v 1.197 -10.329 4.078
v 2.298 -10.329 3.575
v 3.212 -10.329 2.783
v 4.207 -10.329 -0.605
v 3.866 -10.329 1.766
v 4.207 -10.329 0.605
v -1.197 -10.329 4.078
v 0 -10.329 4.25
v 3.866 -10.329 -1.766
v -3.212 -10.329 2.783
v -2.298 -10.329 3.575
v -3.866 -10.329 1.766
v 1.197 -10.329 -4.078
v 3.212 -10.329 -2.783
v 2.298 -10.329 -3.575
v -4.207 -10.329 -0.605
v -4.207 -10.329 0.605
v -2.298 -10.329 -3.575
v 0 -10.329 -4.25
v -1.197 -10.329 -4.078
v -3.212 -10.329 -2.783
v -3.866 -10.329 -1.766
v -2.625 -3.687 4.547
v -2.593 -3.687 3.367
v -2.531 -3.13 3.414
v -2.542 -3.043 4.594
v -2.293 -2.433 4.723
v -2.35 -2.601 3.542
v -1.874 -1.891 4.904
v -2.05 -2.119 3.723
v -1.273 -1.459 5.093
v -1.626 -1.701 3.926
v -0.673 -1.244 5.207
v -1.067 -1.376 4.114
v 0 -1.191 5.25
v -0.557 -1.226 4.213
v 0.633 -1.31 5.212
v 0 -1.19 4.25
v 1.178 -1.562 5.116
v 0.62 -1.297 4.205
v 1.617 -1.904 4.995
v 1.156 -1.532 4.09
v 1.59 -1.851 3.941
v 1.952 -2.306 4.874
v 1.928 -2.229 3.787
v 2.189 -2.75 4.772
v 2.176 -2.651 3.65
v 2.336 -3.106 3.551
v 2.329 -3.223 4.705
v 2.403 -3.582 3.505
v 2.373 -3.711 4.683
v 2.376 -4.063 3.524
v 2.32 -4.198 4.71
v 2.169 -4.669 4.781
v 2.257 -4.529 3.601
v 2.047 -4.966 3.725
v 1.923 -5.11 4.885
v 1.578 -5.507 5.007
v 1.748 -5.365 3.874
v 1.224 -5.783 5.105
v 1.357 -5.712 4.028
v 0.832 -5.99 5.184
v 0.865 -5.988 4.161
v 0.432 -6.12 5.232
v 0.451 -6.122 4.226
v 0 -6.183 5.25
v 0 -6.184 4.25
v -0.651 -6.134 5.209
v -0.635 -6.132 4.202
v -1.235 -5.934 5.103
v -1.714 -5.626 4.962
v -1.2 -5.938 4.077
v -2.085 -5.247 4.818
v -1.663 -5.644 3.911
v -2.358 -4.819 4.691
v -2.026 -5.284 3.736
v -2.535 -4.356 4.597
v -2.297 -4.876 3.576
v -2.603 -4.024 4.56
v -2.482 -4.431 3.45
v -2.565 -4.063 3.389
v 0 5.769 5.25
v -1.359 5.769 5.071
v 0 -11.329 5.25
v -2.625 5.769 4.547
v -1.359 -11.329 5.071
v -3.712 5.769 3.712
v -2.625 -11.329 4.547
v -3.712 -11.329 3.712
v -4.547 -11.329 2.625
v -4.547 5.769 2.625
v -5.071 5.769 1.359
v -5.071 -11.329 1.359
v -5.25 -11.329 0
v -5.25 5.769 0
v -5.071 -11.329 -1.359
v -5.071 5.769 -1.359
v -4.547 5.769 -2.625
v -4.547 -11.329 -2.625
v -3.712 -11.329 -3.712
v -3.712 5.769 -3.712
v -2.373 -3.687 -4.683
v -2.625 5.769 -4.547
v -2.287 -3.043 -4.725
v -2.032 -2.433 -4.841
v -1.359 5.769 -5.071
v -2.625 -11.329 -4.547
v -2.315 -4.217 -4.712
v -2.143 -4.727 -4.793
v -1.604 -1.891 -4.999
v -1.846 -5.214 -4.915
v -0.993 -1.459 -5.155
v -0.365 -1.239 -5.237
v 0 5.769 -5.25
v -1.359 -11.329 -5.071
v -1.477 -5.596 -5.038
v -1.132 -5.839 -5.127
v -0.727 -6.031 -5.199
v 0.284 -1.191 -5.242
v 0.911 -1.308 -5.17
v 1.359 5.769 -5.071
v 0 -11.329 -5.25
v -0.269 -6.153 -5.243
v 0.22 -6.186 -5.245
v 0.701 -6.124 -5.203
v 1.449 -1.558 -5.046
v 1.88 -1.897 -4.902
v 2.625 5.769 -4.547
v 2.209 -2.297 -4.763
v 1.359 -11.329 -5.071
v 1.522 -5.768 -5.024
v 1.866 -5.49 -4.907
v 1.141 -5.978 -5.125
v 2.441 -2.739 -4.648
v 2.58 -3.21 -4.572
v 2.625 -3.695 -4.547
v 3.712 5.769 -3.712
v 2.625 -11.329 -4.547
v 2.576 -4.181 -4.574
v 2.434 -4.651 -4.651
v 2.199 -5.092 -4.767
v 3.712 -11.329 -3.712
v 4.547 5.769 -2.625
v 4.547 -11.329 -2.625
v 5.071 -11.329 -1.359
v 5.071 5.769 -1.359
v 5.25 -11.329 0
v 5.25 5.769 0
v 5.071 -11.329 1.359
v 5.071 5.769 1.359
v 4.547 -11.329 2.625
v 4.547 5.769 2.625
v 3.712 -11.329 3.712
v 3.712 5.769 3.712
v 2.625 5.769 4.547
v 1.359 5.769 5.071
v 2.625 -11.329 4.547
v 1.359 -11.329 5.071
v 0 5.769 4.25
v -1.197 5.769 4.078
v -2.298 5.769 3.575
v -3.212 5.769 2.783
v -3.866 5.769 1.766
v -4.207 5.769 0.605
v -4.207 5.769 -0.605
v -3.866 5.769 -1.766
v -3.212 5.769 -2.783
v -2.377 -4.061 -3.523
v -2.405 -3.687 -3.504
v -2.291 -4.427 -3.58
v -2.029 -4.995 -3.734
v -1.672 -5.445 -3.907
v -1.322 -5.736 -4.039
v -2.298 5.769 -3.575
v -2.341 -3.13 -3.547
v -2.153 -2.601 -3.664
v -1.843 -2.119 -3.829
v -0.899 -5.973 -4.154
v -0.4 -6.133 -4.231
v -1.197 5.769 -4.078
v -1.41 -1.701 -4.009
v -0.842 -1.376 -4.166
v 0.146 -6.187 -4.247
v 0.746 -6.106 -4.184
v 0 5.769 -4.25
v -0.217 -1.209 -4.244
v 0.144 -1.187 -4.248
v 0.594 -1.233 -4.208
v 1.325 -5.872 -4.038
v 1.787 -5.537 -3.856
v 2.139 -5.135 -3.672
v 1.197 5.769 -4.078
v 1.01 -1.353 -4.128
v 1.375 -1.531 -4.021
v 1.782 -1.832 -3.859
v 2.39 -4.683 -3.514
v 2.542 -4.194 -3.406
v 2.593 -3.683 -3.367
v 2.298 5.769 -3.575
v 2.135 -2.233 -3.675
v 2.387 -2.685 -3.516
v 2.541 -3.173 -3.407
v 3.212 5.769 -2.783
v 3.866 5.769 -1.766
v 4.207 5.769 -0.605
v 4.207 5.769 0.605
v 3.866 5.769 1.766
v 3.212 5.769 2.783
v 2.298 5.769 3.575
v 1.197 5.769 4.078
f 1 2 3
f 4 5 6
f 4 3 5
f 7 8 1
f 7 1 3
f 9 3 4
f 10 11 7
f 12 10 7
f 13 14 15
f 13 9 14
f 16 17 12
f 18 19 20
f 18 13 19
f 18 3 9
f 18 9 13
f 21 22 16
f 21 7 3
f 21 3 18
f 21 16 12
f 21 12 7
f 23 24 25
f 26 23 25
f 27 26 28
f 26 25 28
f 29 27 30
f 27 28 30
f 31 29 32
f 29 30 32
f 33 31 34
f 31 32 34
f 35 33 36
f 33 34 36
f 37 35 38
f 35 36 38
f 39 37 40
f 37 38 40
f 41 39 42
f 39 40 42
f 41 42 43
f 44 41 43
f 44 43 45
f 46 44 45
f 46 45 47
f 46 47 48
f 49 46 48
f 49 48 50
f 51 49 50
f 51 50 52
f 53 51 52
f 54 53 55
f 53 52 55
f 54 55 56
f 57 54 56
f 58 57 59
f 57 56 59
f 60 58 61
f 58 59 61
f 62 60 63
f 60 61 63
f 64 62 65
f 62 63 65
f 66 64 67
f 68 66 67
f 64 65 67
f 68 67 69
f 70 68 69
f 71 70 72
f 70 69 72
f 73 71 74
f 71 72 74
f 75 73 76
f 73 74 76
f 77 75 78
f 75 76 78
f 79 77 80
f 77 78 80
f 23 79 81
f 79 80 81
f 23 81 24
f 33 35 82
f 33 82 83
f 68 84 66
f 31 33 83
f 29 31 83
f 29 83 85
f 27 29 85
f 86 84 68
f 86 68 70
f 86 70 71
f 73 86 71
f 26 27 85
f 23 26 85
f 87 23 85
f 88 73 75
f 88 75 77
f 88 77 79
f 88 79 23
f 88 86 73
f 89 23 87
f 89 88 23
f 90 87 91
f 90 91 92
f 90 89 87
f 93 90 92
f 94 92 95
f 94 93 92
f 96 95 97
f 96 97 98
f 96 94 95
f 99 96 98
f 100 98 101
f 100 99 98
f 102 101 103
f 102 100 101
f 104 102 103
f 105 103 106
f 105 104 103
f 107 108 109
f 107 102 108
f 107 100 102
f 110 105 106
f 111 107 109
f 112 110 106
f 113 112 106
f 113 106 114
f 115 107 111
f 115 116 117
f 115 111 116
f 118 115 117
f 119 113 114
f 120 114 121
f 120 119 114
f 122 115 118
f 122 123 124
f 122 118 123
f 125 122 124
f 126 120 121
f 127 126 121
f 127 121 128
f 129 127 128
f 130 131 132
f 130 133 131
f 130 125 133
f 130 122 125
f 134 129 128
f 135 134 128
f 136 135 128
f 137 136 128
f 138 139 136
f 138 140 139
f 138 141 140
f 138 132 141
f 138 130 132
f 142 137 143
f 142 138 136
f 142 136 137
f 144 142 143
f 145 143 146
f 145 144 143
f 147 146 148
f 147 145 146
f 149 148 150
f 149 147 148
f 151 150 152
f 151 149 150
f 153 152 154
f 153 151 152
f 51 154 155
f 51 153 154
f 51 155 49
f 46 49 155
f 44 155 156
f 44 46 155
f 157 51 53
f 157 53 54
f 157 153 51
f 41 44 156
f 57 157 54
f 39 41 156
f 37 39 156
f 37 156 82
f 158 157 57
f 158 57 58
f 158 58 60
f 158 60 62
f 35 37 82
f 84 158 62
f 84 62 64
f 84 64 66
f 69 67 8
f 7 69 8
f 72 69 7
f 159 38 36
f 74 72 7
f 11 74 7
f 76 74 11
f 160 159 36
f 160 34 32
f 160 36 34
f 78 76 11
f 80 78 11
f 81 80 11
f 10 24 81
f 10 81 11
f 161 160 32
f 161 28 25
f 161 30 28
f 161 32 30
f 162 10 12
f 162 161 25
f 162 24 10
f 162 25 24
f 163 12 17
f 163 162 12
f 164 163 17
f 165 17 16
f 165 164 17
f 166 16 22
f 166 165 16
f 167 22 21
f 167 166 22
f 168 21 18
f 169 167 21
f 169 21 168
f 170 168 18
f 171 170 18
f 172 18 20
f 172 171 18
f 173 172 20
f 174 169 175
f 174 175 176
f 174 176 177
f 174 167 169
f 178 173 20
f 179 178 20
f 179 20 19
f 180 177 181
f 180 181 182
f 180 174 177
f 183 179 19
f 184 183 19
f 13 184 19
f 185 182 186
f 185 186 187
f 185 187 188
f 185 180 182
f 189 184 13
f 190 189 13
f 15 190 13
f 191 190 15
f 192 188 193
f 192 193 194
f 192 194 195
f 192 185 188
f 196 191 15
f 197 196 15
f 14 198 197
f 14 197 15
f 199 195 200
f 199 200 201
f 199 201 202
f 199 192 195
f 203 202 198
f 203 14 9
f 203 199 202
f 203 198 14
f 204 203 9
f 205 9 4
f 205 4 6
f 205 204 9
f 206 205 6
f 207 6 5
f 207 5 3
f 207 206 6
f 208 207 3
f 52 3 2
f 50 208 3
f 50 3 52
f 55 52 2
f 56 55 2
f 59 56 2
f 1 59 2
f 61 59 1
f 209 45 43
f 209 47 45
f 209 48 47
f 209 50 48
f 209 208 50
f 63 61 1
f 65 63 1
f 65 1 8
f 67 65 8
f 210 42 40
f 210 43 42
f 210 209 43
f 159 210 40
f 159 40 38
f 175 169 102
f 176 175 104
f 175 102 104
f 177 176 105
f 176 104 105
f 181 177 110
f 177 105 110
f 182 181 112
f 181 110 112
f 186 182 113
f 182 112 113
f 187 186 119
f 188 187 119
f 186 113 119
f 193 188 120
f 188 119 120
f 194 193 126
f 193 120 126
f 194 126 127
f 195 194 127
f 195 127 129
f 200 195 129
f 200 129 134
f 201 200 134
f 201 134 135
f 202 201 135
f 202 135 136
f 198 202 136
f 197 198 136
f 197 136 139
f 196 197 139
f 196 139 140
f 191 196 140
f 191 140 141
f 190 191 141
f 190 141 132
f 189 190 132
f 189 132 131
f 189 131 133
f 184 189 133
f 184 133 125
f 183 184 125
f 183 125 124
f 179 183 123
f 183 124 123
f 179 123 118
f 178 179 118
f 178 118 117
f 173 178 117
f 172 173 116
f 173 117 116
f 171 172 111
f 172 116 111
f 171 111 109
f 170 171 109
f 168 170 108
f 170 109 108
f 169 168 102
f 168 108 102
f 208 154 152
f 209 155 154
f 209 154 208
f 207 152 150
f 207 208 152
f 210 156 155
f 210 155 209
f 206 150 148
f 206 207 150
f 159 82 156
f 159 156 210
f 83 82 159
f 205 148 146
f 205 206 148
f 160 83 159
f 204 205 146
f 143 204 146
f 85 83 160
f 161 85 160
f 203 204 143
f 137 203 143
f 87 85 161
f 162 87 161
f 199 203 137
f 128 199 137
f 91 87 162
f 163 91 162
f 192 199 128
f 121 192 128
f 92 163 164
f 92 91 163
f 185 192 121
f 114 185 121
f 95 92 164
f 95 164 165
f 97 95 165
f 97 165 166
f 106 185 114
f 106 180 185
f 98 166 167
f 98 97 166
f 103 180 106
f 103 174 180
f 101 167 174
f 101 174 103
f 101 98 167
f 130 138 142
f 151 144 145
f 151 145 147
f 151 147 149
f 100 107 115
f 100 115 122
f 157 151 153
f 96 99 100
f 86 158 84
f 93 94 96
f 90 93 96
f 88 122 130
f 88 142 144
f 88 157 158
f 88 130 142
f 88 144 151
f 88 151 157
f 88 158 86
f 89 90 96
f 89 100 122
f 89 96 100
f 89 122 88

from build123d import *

# Parameters (mm, degrees)
TROU_TARAUD_0_801_D = 5


with BuildPart() as part:
    # Esquisse1 → Révolution1 (revolve)
    with BuildSketch(Plane.XY, mode=Mode.PRIVATE) as r_volution1_sk:
        Polygon((-4.25, 5.769230769), (-5.25, 5.769230769), (-5.25, -11.328656218), (0, -11.328656218), (0, -10.328656218), (-4.25, -10.328656218), align=None)
    revolve(r_volution1_sk.sketch.rotate(Axis((0, 8.346153846, 0), (0, -1, 0)), 270), axis=Axis((0, 8.346153846, 0), (0, -1, 0)))

    # Trou taraudé #0-801 (through all)
    with Locations(Plane(origin=(-0.143240146, -3.686819395, 5.248045566), x_dir=(0.999627726819, 0, 0.027283837244), z_dir=(-0.027283837244, 0, 0.999627726819))):
        with Locations((0, 0)):
            Hole(TROU_TARAUD_0_801_D / 2)


solid = part.part
